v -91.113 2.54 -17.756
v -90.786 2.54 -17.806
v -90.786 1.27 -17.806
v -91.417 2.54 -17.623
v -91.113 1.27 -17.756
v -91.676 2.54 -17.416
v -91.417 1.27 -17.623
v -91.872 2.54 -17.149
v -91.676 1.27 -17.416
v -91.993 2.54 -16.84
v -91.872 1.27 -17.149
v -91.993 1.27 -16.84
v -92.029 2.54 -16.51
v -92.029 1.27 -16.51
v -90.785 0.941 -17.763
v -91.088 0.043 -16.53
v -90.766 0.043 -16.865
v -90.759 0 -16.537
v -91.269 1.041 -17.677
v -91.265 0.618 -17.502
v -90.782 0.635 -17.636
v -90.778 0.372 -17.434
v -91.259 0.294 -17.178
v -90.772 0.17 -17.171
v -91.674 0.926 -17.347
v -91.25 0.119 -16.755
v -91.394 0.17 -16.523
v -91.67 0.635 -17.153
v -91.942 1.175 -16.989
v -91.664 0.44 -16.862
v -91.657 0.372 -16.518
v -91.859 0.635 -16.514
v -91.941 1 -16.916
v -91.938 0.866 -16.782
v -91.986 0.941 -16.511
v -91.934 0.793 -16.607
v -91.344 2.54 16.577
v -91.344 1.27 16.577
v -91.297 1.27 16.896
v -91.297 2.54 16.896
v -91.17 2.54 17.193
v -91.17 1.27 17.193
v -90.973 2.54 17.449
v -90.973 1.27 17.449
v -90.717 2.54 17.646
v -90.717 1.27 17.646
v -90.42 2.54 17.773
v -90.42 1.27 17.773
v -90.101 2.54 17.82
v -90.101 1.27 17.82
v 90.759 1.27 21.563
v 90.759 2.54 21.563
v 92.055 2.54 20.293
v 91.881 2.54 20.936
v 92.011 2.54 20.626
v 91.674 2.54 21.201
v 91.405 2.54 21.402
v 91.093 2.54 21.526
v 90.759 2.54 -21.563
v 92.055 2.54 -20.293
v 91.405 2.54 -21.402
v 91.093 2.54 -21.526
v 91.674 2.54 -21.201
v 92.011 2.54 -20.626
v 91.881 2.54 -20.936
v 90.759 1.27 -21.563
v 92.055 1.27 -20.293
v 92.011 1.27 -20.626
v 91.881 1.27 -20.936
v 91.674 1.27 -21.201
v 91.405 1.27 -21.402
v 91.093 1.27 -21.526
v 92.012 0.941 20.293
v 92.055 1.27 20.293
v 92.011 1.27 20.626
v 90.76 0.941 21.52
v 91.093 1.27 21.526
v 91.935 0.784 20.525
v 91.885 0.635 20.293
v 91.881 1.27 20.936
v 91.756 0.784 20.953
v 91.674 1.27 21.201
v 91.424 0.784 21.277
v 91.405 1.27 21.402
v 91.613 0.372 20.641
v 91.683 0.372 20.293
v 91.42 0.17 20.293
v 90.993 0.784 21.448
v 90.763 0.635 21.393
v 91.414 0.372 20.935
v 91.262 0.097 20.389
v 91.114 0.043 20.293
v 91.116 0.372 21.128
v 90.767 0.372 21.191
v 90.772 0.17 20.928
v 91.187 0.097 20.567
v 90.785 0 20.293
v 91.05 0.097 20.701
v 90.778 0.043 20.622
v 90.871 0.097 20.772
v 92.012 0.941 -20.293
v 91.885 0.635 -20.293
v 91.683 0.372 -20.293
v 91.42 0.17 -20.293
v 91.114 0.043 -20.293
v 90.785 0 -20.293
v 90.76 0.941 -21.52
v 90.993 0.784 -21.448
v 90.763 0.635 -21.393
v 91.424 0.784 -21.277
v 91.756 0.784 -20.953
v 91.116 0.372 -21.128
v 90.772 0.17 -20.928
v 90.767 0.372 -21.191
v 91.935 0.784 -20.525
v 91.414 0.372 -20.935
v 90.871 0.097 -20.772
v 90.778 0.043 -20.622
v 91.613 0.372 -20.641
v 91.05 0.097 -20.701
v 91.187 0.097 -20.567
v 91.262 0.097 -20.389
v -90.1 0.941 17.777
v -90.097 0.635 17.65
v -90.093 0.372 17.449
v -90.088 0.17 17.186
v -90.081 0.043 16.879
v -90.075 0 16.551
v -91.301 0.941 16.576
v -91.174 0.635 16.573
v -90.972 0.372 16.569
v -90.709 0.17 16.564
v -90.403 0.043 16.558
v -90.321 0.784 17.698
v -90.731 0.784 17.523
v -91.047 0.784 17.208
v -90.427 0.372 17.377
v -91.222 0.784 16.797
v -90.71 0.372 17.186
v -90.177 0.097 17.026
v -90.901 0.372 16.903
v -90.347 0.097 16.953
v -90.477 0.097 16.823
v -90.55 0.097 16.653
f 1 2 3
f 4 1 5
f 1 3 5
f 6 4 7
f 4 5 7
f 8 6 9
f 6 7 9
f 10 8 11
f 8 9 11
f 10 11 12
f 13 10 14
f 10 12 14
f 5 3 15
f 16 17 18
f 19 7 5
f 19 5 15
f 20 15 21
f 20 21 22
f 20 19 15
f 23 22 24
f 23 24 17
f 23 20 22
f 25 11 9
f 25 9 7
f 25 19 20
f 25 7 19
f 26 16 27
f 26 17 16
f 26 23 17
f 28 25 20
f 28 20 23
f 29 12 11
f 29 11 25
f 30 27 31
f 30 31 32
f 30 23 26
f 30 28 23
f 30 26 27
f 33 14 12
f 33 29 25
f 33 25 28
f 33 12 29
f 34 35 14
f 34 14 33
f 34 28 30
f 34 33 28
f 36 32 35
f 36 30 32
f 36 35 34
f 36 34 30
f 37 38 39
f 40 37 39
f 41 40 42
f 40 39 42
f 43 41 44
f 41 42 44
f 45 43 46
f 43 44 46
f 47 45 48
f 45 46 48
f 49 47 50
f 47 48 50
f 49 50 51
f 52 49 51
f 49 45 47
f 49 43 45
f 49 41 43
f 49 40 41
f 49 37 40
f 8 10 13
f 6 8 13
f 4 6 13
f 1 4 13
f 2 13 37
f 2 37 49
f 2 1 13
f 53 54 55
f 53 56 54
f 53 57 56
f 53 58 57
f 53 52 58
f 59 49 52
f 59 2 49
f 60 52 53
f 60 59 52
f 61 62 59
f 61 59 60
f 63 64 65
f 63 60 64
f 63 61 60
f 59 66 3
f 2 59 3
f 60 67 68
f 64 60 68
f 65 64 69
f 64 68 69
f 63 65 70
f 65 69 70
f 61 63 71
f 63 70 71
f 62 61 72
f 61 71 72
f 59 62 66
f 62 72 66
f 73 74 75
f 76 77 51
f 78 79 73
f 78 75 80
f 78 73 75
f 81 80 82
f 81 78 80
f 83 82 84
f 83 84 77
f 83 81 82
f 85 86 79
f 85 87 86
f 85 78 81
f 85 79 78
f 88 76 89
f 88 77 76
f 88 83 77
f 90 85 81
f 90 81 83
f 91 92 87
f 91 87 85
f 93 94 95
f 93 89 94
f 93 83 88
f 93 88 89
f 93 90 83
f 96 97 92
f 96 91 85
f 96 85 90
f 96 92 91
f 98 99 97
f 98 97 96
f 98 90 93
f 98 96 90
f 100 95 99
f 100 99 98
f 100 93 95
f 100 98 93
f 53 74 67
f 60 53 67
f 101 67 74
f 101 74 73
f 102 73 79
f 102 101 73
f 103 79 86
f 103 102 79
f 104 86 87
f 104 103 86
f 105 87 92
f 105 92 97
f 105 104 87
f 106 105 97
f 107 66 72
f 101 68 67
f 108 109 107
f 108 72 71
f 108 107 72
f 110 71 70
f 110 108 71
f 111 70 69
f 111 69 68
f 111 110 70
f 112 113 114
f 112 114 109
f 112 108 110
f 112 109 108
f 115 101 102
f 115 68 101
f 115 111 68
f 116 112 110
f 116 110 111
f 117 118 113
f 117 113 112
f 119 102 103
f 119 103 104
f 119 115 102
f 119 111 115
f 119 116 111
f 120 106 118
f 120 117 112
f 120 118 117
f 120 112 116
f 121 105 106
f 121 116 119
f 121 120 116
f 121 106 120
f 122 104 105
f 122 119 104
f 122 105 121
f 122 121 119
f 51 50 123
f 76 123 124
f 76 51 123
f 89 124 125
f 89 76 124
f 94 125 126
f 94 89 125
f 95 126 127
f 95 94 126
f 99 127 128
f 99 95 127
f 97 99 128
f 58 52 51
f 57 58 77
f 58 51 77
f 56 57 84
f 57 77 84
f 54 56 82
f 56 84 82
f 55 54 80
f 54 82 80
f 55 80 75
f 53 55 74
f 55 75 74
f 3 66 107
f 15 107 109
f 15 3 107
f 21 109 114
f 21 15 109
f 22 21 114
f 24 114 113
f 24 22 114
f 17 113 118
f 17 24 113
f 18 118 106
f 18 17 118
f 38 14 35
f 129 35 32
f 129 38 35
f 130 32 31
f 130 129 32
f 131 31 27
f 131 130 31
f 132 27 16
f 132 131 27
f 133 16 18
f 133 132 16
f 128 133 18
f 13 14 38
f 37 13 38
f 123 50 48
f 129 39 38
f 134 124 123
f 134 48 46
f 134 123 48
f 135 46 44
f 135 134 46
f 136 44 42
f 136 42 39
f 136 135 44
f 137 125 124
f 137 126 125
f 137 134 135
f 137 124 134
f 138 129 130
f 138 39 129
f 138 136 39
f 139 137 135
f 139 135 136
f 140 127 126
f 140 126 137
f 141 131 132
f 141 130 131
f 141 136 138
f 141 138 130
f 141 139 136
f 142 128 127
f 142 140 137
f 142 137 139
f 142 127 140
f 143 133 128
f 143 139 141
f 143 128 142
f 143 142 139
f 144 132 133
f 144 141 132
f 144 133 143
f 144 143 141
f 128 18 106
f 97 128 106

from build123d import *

# Parameters (mm, degrees)
BOSS_EXTRUDE1_DEPTH = 2.54
FILLET1_R           = 1.27
FILLET2_R           = 1.27


with BuildPart() as part:
    # Sketch1 → Boss-Extrude1 (new body)
    with BuildSketch(Plane(origin=(0, 0, 0), x_dir=(1, 0, 0), z_dir=(0, 1, 0))):
        Polygon((-92.055290994, 17.78), (-91.319094065, -17.795234922), (92.055290994, -21.59), (92.055290994, 21.59), align=None)
    extrude(amount=BOSS_EXTRUDE1_DEPTH)

    # Fillet1
    fillet1_edges = [part.edges().sort_by_distance(p)[0] for p in [
        (92.055290994, 0, 0),
        (0.368098464, 0, 19.692617461),
        (-91.68719253, 0, 0.007617461),
        (0, 0, -19.685),
    ]]
    fillet(fillet1_edges, radius=FILLET1_R)

    # Fillet2
    # the kernel refuses this fillet: 1.27 mm, written as the material it takes off along each edge
    with BuildSketch(Plane(origin=(-90.074576314, 1.27, 16.550717171), x_dir=(-0.9997859461749034, 0, 0.020689655172412804), z_dir=(0, -1, 0))) as fillet2_piece_1_section:
        Polygon((0, 0), (FILLET2_R, 0), (FILLET2_R, -FILLET2_R * 0.959450955721), (FILLET2_R * 0.0413704529452, -FILLET2_R * 0.999143876338), align=None)
    fillet2_piece_1 = extrude(amount=FILLET2_R, mode=Mode.PRIVATE)
    fillet2_piece_1 = fillet2_piece_1 - Plane(origin=(-90.074576314, 1.27, 16.550717171), x_dir=(0.7071067811865478, 0, -0.7071067811865471), z_dir=(0, -1, 0)) * Sphere(FILLET2_R, mode=Mode.PRIVATE)
    add(fillet2_piece_1, mode=Mode.SUBTRACT)
    with BuildSketch(Plane(origin=(-90.75928698, 1.27, -16.53654771), x_dir=(-0.020689655172410656, 0, -0.9997859461749034), z_dir=(-0.9997859461749034, 0, 0.020689655172412804))) as fillet2_piece_2_section:
        Polygon((0, 0), (FILLET2_R, 0), (FILLET2_R, FILLET2_R), (0, FILLET2_R), align=None)
    fillet2_piece_2 = extrude(amount=FILLET2_R, mode=Mode.PRIVATE)
    fillet2_piece_2 = fillet2_piece_2 - Plane(origin=(-90.75928698, 1.27, -16.53654771), x_dir=(0.014629795472822902, 0.7071067811865475, 0.7069554222752827), z_dir=(-0.9997859461749034, 0, 0.020689655172412804)) * Sphere(FILLET2_R, mode=Mode.PRIVATE)
    add(fillet2_piece_2, mode=Mode.SUBTRACT)
    with BuildSketch(Plane(origin=(90.785290994, 1.27, 20.293446606), x_dir=(-0.020689655172413755, 0, 0.9997859461749034), z_dir=(0, -1, 0))) as fillet2_piece_3_section:
        Polygon((0, 0), (FILLET2_R, 0), (FILLET2_R, -FILLET2_R * 1.02090818447), (-FILLET2_R * 0.0206896551724, -FILLET2_R * 0.999785946175), align=None)
    fillet2_piece_3 = extrude(amount=FILLET2_R, mode=Mode.PRIVATE)
    fillet2_piece_3 = fillet2_piece_3 - Plane(origin=(90.785290994, 1.27, 20.293446606), x_dir=(-0.6997536512329129, 0, -0.7143842296595067), z_dir=(0, -1, 0)) * Sphere(FILLET2_R, mode=Mode.PRIVATE)
    add(fillet2_piece_3, mode=Mode.SUBTRACT)
    with BuildSketch(Plane(origin=(90.785290994, 1.27, -20.293446606), x_dir=(-0.020689655172410656, 0, -0.9997859461749034), z_dir=(0, -1, 0))) as fillet2_piece_4_section:
        Polygon((0, 0), (FILLET2_R, 0), (FILLET2_R, FILLET2_R * 1.02090818447), (-FILLET2_R * 0.0206896551724, FILLET2_R * 0.999785946175), align=None)
    fillet2_piece_4 = extrude(amount=FILLET2_R, mode=Mode.PRIVATE)
    fillet2_piece_4 = fillet2_piece_4 - Plane(origin=(90.785290994, 1.27, -20.293446606), x_dir=(-0.6997536512329141, 0, 0.7143842296595057), z_dir=(0, -1, 0)) * Sphere(FILLET2_R, mode=Mode.PRIVATE)
    add(fillet2_piece_4, mode=Mode.SUBTRACT)
    with BuildSketch(Plane(origin=(92.055290994, 1.27, -21.59), x_dir=(-0.9997859461749034, 0, 0.020689655172409293), z_dir=(0, 1, 0))) as fillet2_piece_5:
        with BuildLine():
            CenterArc((FILLET2_R * 1.02090818447, FILLET2_R), FILLET2_R, 178.81448549, 91.18551451)
            Line((FILLET2_R * 0.0211222382995, FILLET2_R * 1.02068965517), (0, 0))
            Line((0, 0), (FILLET2_R * 1.02090818447, 0))
        make_face()
    extrude(amount=4.511383486, mode=Mode.SUBTRACT)
    with BuildSketch(Plane(origin=(92.055290994, 1.27, 21.59), x_dir=(-0.9997859461749034, 0, -0.020689655172415226), z_dir=(0, 1, 0))) as fillet2_piece_6:
        with BuildLine():
            CenterArc((FILLET2_R * 1.02090818447, -FILLET2_R), FILLET2_R, 90, 91.18551451)
            Line((FILLET2_R * 0.0211222382994, -FILLET2_R * 1.02068965517), (0, 0))
            Line((0, 0), (FILLET2_R * 1.02090818447, 0))
        make_face()
    extrude(amount=4.511383486, mode=Mode.SUBTRACT)
    with BuildSketch(Plane(origin=(-91.319094065, 1.27, 17.795234922), x_dir=(-0.020689655172414192, 0, -0.9997859461749034), z_dir=(0, 1, 0))) as fillet2_piece_7:
        with BuildLine():
            CenterArc((FILLET2_R * 0.959450955721, -FILLET2_R), FILLET2_R, 90, 87.62897098)
            Line((-FILLET2_R * 0.0396929206169, -FILLET2_R * 0.958629547055), (0, 0))
            Line((0, 0), (FILLET2_R * 0.959450955721, 0))
        make_face()
    extrude(amount=4.316256784, mode=Mode.SUBTRACT)
    with BuildSketch(Plane(origin=(-92.055290994, 1.27, -17.78), x_dir=(0.020689655172417935, 0, 0.9997859461749031), z_dir=(0, 1, 0))) as fillet2_piece_8:
        with BuildLine():
            CenterArc((FILLET2_R, FILLET2_R), FILLET2_R, 180, 90)
            Line((0, FILLET2_R), (0, 0))
            Line((0, 0), (FILLET2_R, 0))
        make_face()
    extrude(amount=4.445, mode=Mode.SUBTRACT)


solid = part.part
